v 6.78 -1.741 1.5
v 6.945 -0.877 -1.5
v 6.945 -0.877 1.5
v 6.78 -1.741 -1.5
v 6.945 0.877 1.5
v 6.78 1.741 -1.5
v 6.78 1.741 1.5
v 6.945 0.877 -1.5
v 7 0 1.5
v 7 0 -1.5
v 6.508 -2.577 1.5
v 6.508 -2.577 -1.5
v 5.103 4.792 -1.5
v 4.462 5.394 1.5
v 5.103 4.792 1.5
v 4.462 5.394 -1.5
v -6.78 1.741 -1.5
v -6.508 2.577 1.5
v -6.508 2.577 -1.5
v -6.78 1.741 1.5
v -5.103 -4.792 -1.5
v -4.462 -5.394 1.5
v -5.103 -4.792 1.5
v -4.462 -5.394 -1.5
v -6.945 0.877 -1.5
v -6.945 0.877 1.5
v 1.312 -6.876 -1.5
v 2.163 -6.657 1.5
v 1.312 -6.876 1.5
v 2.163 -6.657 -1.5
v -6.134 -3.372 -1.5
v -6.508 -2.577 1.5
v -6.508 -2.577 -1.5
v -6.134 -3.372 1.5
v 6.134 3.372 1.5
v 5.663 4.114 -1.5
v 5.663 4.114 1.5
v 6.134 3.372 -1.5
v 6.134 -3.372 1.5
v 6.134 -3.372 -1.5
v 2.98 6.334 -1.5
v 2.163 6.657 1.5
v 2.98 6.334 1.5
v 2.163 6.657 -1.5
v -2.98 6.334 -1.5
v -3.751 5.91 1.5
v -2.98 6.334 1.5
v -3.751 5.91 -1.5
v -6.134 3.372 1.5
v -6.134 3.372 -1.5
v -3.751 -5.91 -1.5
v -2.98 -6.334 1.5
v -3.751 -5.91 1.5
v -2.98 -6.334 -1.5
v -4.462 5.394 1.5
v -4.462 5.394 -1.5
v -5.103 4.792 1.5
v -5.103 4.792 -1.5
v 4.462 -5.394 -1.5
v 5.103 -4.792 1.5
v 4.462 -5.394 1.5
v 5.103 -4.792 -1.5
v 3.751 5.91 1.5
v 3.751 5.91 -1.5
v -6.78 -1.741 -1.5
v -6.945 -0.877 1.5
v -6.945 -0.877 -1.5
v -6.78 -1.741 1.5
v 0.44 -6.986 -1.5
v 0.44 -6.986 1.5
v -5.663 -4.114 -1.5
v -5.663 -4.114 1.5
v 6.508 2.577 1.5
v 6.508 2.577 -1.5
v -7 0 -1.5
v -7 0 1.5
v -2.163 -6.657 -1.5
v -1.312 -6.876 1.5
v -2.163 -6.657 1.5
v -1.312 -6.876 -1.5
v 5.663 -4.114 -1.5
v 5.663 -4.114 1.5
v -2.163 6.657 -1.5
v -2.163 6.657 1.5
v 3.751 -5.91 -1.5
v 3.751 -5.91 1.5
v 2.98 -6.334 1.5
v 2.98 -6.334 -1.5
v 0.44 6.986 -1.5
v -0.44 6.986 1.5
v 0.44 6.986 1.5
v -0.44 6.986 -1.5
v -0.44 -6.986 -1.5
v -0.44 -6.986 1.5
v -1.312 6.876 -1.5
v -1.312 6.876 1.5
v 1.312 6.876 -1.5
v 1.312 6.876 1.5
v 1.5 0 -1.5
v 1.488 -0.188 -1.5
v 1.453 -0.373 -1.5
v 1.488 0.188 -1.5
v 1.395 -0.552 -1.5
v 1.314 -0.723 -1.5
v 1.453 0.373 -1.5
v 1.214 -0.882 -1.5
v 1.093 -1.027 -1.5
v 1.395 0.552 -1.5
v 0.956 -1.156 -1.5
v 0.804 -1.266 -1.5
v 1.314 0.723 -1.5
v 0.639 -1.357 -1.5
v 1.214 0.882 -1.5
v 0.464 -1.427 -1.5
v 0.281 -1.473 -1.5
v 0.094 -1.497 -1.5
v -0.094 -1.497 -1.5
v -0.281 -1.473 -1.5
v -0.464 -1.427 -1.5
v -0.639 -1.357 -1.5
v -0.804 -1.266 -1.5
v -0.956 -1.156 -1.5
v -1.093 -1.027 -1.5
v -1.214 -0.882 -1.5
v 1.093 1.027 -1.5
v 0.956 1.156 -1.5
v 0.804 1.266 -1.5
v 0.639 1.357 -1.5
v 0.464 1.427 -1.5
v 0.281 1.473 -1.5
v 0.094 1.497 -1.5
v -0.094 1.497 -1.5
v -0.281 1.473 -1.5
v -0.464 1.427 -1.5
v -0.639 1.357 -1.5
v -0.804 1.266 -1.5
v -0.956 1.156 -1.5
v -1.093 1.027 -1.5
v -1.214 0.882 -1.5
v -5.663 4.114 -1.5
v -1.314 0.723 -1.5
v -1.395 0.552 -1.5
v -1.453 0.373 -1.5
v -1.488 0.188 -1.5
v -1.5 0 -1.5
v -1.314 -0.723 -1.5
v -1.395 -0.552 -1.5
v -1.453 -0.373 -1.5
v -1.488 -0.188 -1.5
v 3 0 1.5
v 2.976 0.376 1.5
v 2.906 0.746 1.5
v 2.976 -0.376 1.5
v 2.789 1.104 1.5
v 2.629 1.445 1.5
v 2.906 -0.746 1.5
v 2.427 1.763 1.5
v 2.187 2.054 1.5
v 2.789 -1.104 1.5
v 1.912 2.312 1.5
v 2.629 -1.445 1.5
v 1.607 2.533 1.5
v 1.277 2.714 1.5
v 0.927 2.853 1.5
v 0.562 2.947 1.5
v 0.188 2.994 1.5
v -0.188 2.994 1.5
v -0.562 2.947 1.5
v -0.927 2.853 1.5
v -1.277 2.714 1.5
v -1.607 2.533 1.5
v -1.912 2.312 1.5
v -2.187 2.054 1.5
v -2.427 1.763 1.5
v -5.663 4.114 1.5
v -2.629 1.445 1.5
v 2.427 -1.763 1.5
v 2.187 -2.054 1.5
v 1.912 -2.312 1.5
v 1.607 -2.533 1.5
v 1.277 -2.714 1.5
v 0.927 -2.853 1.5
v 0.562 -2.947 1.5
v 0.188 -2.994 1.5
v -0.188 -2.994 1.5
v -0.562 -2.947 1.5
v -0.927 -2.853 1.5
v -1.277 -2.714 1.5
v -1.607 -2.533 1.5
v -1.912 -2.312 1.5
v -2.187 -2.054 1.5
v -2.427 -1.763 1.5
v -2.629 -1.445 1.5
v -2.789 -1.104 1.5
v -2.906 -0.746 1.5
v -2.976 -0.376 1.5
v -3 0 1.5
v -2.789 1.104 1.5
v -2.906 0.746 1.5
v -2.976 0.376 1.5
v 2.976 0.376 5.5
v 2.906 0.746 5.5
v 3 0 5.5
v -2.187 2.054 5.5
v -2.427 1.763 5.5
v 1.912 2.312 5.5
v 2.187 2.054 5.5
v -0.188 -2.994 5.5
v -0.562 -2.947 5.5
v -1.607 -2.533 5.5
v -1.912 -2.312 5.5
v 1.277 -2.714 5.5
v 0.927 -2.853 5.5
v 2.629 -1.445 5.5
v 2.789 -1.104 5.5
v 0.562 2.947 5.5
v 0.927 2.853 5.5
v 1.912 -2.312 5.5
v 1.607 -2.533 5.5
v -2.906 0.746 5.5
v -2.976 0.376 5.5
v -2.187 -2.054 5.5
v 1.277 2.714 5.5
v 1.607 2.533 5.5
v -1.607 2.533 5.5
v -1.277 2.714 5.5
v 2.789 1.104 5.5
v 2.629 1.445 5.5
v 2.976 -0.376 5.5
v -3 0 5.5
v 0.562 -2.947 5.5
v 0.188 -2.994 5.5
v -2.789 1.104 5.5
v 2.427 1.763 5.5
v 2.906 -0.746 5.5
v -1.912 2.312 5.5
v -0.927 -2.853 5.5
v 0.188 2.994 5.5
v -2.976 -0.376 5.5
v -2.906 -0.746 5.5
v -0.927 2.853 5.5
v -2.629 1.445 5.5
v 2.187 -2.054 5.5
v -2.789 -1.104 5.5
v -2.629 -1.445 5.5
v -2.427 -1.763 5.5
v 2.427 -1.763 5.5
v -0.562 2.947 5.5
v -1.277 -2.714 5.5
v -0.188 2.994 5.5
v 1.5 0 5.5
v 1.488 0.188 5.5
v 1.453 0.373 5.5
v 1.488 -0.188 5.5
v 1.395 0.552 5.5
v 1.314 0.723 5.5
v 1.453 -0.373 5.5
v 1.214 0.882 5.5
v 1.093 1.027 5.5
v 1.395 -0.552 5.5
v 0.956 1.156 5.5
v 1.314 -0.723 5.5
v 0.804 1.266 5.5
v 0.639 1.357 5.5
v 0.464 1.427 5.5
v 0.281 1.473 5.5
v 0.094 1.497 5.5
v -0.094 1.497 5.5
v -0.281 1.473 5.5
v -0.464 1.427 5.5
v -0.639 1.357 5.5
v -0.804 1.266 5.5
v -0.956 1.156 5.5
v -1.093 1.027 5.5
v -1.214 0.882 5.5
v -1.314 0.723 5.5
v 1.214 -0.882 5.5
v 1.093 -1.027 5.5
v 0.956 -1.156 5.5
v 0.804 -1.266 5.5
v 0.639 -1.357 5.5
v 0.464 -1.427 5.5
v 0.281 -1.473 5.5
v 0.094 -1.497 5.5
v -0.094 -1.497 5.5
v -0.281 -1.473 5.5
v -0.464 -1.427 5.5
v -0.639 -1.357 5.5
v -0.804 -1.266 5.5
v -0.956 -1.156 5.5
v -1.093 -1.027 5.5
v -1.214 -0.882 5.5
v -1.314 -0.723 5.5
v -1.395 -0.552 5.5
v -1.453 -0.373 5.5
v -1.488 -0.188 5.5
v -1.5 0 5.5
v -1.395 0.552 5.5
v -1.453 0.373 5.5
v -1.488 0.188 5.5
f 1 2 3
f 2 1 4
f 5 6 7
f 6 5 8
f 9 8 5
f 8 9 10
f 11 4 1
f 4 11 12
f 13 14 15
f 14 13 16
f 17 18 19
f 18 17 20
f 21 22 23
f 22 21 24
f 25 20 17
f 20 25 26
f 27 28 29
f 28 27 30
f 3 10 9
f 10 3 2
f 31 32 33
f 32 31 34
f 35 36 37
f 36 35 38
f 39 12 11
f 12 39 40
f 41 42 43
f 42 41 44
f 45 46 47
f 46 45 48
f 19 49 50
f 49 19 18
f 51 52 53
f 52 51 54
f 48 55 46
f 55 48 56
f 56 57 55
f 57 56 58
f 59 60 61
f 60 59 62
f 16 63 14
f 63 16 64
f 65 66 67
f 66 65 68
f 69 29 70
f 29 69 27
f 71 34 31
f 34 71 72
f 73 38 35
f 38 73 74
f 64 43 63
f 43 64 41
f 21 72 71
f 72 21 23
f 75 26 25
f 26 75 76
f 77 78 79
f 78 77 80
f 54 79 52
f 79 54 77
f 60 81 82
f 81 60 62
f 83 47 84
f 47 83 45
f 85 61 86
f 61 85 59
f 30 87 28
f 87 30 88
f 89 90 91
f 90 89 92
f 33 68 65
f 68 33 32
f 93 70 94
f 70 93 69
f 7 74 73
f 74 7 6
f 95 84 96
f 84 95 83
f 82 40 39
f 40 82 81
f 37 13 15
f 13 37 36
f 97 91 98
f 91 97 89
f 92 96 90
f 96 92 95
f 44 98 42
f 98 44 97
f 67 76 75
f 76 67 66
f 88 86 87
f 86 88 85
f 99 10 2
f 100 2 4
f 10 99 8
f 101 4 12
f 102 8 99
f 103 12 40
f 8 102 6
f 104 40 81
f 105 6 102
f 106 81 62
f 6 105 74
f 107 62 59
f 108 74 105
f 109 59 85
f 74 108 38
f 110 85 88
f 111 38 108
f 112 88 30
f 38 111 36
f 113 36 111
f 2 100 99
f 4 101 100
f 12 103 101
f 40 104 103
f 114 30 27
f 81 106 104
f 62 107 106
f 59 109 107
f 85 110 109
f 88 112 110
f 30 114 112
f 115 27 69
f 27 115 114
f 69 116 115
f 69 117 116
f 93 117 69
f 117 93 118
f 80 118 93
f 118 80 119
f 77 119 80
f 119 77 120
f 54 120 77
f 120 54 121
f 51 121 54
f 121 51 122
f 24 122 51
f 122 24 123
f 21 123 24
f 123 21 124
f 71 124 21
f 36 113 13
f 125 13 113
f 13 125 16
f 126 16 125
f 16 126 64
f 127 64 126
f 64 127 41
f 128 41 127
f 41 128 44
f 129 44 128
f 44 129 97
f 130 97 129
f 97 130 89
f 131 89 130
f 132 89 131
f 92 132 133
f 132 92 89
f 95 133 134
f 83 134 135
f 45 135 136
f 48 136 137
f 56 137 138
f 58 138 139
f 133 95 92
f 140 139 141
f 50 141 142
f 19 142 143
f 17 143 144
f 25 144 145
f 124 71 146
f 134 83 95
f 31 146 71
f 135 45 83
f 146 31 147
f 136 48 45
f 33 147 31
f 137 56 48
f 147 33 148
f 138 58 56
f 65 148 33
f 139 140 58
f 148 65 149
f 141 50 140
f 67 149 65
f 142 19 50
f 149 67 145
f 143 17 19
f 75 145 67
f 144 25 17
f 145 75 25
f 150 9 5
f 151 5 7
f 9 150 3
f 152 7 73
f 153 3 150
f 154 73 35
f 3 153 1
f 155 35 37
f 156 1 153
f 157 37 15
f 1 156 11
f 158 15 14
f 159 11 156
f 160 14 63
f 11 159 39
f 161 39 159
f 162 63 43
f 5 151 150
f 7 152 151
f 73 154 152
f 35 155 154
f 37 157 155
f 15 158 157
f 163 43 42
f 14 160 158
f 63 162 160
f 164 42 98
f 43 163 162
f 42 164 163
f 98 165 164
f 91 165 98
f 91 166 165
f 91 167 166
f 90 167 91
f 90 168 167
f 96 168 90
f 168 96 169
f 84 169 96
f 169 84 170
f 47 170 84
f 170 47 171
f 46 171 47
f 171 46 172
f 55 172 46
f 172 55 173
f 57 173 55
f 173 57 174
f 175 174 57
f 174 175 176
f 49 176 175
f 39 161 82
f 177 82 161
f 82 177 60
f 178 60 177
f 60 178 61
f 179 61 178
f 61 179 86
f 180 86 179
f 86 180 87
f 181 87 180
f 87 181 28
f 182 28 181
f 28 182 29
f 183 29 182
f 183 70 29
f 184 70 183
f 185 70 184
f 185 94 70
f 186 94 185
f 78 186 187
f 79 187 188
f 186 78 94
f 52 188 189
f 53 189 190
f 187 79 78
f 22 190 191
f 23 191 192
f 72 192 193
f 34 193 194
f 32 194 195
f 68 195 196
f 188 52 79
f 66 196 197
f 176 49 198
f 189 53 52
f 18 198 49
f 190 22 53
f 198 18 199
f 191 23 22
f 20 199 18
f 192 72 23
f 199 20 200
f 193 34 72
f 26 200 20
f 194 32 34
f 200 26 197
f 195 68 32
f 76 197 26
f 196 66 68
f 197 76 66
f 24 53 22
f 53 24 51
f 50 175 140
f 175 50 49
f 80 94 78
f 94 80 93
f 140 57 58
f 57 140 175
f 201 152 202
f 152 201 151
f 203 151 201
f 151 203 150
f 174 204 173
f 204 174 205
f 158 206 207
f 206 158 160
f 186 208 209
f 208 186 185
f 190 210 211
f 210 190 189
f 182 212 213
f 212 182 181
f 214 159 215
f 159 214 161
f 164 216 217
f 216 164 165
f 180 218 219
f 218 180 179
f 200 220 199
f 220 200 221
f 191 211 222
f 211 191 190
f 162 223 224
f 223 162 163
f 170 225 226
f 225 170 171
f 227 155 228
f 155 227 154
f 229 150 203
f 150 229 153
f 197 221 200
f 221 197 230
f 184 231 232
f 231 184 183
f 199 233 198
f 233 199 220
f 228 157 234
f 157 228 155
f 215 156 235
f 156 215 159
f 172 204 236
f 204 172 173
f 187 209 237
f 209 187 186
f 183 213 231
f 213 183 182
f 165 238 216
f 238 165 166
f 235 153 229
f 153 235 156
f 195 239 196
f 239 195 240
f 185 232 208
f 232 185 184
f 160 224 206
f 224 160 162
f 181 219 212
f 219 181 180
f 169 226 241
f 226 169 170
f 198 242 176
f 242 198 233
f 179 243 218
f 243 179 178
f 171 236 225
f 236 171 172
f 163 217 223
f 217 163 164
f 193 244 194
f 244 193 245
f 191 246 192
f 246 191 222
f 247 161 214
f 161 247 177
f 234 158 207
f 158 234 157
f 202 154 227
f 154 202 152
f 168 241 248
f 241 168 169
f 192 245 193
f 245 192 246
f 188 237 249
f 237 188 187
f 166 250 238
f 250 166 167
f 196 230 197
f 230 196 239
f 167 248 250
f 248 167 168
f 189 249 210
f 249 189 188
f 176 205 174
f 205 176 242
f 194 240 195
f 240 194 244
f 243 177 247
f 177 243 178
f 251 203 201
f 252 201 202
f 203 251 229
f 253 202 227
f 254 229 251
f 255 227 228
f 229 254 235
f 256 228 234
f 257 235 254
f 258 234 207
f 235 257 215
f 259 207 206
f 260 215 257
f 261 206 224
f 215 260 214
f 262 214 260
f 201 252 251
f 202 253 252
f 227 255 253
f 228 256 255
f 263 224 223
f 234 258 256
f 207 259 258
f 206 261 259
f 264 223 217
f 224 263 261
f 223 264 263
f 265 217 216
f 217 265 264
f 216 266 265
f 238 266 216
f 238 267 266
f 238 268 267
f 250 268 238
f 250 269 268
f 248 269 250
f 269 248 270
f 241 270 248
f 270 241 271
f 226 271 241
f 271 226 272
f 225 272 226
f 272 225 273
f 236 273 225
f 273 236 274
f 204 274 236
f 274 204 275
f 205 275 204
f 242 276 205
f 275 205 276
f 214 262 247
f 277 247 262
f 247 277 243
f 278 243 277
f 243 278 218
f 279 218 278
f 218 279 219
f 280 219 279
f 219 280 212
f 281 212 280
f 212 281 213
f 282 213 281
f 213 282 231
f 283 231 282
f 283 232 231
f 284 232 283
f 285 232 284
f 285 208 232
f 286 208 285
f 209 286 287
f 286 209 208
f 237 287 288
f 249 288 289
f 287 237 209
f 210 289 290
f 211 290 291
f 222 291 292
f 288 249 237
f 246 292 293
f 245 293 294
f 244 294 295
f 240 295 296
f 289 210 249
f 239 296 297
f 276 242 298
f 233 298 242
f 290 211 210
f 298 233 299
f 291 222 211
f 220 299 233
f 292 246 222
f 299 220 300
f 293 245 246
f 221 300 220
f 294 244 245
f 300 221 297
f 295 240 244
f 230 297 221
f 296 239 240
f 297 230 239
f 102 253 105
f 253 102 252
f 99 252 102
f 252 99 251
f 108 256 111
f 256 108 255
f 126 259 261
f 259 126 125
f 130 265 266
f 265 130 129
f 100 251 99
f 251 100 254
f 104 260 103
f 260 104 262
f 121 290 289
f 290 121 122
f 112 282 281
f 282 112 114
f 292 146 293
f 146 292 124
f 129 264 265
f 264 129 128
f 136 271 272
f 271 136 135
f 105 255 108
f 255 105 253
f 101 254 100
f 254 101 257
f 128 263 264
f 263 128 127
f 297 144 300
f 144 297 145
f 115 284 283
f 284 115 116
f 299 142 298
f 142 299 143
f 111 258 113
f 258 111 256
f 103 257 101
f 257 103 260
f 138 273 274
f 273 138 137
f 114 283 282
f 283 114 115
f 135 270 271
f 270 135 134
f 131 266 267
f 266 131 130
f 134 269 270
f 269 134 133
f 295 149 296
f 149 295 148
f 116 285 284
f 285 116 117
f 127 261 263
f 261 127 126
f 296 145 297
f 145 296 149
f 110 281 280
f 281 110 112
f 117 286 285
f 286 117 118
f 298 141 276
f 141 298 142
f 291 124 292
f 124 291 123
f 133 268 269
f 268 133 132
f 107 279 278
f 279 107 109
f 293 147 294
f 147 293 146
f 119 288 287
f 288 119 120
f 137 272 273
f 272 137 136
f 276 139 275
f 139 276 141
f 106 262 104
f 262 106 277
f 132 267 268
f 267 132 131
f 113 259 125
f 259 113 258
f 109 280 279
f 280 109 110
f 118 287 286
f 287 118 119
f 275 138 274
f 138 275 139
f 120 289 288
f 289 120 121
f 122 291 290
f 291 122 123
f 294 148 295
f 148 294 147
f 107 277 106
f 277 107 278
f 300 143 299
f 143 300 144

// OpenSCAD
$fn = 50;


difference() {
	union() {
		translate(v = [0, 0, -1.5000000000]) {
			cylinder(h = 3, r = 7.0000000000);
		}
		translate(v = [0, 0, -1.5000000000]) {
			cylinder(h = 7, r = 3.0000000000);
		}
	}
	union() {
		translate(v = [0, 0, -100.0000000000]) {
			cylinder(h = 200, r = 1.5000000000);
		}
	}
}
